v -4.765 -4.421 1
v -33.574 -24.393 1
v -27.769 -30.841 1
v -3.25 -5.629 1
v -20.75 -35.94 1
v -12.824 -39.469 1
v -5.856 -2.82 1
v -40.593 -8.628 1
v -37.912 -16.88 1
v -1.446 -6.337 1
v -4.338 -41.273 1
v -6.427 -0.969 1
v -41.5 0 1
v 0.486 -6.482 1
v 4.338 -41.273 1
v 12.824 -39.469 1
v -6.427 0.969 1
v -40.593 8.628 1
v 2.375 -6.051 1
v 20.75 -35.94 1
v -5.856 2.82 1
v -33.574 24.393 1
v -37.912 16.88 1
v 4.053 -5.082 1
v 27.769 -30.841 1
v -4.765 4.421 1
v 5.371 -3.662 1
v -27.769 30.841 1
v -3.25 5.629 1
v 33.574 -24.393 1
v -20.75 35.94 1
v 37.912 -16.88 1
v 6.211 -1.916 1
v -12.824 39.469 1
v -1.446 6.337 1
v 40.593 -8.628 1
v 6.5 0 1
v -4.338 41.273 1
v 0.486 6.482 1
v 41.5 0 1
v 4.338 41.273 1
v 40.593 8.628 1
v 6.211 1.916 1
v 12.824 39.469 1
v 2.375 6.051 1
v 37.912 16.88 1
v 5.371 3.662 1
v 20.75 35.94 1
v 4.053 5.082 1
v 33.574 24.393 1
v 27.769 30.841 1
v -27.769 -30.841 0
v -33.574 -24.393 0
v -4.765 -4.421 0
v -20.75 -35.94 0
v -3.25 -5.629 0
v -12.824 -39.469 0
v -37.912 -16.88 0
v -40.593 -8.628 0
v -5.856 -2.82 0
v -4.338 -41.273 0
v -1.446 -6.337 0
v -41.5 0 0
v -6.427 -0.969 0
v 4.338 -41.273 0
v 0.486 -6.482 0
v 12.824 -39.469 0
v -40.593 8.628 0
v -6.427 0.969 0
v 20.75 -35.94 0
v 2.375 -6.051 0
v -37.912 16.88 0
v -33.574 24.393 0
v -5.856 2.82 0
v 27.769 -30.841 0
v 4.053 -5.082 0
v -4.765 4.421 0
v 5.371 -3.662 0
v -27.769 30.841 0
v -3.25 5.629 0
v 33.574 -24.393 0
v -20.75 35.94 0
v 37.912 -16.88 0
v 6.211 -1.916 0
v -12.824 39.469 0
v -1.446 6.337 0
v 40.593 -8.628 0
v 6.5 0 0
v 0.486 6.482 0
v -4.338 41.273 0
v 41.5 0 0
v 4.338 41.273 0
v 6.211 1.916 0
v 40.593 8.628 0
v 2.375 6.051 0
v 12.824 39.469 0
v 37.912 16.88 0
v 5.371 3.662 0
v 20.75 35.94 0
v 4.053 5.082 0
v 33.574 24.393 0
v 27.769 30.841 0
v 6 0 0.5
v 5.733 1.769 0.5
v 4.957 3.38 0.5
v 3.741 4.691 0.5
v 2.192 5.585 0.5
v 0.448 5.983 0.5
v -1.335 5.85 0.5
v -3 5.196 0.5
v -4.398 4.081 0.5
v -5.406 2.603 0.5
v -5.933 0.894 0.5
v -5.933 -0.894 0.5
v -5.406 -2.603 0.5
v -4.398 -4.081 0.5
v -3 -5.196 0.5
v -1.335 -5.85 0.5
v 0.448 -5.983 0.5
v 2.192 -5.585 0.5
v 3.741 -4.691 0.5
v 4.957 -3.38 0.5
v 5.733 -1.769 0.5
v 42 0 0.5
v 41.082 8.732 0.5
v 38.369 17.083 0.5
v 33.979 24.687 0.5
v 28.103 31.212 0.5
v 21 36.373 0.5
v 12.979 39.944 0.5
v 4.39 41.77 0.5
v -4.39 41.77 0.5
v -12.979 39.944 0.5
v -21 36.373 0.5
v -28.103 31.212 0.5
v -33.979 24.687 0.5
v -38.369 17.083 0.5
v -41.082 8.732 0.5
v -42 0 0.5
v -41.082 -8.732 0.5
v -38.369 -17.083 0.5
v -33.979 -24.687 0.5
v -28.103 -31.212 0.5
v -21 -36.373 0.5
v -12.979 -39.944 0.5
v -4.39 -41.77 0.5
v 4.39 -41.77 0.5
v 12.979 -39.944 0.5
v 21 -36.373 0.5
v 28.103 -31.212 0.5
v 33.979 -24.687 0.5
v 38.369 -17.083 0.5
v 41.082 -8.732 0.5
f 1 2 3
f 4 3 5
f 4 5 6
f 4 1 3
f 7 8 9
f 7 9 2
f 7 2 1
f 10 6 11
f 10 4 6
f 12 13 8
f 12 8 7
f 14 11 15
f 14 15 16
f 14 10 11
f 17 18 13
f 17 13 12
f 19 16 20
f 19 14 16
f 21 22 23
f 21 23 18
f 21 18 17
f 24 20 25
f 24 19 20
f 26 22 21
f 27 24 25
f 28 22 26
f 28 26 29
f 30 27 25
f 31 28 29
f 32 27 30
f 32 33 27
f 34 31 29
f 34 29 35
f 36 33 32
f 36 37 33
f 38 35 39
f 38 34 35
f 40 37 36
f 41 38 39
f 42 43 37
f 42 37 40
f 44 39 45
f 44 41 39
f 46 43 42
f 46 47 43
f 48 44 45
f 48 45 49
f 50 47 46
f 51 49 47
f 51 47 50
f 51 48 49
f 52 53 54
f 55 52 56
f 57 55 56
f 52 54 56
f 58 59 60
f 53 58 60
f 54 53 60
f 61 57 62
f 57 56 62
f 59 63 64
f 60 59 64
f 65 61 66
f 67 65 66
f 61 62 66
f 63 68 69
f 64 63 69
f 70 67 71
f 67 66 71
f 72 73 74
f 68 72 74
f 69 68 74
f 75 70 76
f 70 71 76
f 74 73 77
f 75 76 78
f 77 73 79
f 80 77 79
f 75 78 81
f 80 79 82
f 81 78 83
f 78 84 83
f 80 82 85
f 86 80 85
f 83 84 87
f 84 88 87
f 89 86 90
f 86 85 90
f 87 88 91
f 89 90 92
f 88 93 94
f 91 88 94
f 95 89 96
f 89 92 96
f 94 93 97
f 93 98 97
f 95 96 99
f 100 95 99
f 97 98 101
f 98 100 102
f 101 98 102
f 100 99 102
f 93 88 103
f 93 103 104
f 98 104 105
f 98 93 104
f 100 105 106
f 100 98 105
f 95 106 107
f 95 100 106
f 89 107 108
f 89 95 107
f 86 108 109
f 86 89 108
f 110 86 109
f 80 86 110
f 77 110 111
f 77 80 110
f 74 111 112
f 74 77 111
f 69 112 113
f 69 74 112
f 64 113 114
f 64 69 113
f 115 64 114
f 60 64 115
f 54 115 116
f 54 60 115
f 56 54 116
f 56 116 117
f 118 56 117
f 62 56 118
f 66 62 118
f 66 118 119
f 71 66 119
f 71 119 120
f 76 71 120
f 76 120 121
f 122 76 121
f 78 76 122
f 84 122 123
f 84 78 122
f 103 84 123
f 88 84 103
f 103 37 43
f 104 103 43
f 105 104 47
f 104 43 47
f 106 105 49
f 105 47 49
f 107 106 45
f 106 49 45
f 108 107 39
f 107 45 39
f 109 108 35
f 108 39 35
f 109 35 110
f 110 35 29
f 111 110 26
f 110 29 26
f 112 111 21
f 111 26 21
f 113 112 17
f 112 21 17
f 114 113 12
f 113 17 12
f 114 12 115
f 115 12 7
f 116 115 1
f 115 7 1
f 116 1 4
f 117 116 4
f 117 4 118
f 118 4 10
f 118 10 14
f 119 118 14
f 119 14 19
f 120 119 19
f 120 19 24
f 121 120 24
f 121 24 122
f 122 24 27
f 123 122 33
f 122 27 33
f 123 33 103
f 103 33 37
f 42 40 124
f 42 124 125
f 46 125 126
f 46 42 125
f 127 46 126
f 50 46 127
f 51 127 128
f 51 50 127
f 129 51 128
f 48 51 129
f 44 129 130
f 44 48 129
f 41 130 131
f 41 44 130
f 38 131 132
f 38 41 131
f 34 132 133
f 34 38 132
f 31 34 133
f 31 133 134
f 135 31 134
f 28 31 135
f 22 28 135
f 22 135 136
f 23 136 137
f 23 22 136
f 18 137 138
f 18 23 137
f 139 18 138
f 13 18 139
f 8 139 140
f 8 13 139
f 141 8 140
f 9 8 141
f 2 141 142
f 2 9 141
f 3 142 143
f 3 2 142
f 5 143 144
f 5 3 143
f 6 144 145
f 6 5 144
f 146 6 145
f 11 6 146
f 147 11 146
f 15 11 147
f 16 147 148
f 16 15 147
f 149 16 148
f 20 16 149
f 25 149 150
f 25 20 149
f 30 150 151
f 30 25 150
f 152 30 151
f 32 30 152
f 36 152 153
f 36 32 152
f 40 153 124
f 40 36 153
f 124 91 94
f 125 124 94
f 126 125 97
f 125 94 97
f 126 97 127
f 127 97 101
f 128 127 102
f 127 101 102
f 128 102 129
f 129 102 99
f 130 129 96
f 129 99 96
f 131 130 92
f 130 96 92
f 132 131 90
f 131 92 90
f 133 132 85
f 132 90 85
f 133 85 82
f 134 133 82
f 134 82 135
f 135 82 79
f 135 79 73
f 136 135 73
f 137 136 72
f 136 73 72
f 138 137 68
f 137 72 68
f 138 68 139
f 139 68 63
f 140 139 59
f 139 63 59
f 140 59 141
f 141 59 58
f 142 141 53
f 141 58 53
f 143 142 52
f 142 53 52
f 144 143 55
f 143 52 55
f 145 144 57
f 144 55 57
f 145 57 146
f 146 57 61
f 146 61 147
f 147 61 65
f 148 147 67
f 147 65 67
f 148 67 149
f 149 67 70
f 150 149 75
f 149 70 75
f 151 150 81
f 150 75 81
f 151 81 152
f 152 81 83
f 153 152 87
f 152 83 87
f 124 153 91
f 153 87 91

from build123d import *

# Parameters (mm, degrees)
F0_R     = 42
F0_R_2   = 6
F1_DEPTH = 1
F2_SIZE  = 0.49999


# Not quite as in the source:
# - a fillet or chamfer is up to 0.001 mm smaller than in the source, because OpenCascade refuses the exact size


with BuildPart() as f1:
    # F0 (on Top) → F1 (new body)
    with BuildSketch(Plane.XY):
        Circle(F0_R)
        Circle(F0_R_2, mode=Mode.SUBTRACT)
    extrude(amount=F1_DEPTH)

    # F2 (size 0.5 in the source; OpenCascade refuses exactly that, so slightly less here)
    f2_edges = [f1.edges().sort_by_distance(p)[0] for p in [
        (-6, 0, 1),
        (-42, 0, 1),
        (-42, 0, 0),
        (-6, 0, 0),
    ]]
    chamfer(f2_edges, length=F2_SIZE)


solid = f1.part
